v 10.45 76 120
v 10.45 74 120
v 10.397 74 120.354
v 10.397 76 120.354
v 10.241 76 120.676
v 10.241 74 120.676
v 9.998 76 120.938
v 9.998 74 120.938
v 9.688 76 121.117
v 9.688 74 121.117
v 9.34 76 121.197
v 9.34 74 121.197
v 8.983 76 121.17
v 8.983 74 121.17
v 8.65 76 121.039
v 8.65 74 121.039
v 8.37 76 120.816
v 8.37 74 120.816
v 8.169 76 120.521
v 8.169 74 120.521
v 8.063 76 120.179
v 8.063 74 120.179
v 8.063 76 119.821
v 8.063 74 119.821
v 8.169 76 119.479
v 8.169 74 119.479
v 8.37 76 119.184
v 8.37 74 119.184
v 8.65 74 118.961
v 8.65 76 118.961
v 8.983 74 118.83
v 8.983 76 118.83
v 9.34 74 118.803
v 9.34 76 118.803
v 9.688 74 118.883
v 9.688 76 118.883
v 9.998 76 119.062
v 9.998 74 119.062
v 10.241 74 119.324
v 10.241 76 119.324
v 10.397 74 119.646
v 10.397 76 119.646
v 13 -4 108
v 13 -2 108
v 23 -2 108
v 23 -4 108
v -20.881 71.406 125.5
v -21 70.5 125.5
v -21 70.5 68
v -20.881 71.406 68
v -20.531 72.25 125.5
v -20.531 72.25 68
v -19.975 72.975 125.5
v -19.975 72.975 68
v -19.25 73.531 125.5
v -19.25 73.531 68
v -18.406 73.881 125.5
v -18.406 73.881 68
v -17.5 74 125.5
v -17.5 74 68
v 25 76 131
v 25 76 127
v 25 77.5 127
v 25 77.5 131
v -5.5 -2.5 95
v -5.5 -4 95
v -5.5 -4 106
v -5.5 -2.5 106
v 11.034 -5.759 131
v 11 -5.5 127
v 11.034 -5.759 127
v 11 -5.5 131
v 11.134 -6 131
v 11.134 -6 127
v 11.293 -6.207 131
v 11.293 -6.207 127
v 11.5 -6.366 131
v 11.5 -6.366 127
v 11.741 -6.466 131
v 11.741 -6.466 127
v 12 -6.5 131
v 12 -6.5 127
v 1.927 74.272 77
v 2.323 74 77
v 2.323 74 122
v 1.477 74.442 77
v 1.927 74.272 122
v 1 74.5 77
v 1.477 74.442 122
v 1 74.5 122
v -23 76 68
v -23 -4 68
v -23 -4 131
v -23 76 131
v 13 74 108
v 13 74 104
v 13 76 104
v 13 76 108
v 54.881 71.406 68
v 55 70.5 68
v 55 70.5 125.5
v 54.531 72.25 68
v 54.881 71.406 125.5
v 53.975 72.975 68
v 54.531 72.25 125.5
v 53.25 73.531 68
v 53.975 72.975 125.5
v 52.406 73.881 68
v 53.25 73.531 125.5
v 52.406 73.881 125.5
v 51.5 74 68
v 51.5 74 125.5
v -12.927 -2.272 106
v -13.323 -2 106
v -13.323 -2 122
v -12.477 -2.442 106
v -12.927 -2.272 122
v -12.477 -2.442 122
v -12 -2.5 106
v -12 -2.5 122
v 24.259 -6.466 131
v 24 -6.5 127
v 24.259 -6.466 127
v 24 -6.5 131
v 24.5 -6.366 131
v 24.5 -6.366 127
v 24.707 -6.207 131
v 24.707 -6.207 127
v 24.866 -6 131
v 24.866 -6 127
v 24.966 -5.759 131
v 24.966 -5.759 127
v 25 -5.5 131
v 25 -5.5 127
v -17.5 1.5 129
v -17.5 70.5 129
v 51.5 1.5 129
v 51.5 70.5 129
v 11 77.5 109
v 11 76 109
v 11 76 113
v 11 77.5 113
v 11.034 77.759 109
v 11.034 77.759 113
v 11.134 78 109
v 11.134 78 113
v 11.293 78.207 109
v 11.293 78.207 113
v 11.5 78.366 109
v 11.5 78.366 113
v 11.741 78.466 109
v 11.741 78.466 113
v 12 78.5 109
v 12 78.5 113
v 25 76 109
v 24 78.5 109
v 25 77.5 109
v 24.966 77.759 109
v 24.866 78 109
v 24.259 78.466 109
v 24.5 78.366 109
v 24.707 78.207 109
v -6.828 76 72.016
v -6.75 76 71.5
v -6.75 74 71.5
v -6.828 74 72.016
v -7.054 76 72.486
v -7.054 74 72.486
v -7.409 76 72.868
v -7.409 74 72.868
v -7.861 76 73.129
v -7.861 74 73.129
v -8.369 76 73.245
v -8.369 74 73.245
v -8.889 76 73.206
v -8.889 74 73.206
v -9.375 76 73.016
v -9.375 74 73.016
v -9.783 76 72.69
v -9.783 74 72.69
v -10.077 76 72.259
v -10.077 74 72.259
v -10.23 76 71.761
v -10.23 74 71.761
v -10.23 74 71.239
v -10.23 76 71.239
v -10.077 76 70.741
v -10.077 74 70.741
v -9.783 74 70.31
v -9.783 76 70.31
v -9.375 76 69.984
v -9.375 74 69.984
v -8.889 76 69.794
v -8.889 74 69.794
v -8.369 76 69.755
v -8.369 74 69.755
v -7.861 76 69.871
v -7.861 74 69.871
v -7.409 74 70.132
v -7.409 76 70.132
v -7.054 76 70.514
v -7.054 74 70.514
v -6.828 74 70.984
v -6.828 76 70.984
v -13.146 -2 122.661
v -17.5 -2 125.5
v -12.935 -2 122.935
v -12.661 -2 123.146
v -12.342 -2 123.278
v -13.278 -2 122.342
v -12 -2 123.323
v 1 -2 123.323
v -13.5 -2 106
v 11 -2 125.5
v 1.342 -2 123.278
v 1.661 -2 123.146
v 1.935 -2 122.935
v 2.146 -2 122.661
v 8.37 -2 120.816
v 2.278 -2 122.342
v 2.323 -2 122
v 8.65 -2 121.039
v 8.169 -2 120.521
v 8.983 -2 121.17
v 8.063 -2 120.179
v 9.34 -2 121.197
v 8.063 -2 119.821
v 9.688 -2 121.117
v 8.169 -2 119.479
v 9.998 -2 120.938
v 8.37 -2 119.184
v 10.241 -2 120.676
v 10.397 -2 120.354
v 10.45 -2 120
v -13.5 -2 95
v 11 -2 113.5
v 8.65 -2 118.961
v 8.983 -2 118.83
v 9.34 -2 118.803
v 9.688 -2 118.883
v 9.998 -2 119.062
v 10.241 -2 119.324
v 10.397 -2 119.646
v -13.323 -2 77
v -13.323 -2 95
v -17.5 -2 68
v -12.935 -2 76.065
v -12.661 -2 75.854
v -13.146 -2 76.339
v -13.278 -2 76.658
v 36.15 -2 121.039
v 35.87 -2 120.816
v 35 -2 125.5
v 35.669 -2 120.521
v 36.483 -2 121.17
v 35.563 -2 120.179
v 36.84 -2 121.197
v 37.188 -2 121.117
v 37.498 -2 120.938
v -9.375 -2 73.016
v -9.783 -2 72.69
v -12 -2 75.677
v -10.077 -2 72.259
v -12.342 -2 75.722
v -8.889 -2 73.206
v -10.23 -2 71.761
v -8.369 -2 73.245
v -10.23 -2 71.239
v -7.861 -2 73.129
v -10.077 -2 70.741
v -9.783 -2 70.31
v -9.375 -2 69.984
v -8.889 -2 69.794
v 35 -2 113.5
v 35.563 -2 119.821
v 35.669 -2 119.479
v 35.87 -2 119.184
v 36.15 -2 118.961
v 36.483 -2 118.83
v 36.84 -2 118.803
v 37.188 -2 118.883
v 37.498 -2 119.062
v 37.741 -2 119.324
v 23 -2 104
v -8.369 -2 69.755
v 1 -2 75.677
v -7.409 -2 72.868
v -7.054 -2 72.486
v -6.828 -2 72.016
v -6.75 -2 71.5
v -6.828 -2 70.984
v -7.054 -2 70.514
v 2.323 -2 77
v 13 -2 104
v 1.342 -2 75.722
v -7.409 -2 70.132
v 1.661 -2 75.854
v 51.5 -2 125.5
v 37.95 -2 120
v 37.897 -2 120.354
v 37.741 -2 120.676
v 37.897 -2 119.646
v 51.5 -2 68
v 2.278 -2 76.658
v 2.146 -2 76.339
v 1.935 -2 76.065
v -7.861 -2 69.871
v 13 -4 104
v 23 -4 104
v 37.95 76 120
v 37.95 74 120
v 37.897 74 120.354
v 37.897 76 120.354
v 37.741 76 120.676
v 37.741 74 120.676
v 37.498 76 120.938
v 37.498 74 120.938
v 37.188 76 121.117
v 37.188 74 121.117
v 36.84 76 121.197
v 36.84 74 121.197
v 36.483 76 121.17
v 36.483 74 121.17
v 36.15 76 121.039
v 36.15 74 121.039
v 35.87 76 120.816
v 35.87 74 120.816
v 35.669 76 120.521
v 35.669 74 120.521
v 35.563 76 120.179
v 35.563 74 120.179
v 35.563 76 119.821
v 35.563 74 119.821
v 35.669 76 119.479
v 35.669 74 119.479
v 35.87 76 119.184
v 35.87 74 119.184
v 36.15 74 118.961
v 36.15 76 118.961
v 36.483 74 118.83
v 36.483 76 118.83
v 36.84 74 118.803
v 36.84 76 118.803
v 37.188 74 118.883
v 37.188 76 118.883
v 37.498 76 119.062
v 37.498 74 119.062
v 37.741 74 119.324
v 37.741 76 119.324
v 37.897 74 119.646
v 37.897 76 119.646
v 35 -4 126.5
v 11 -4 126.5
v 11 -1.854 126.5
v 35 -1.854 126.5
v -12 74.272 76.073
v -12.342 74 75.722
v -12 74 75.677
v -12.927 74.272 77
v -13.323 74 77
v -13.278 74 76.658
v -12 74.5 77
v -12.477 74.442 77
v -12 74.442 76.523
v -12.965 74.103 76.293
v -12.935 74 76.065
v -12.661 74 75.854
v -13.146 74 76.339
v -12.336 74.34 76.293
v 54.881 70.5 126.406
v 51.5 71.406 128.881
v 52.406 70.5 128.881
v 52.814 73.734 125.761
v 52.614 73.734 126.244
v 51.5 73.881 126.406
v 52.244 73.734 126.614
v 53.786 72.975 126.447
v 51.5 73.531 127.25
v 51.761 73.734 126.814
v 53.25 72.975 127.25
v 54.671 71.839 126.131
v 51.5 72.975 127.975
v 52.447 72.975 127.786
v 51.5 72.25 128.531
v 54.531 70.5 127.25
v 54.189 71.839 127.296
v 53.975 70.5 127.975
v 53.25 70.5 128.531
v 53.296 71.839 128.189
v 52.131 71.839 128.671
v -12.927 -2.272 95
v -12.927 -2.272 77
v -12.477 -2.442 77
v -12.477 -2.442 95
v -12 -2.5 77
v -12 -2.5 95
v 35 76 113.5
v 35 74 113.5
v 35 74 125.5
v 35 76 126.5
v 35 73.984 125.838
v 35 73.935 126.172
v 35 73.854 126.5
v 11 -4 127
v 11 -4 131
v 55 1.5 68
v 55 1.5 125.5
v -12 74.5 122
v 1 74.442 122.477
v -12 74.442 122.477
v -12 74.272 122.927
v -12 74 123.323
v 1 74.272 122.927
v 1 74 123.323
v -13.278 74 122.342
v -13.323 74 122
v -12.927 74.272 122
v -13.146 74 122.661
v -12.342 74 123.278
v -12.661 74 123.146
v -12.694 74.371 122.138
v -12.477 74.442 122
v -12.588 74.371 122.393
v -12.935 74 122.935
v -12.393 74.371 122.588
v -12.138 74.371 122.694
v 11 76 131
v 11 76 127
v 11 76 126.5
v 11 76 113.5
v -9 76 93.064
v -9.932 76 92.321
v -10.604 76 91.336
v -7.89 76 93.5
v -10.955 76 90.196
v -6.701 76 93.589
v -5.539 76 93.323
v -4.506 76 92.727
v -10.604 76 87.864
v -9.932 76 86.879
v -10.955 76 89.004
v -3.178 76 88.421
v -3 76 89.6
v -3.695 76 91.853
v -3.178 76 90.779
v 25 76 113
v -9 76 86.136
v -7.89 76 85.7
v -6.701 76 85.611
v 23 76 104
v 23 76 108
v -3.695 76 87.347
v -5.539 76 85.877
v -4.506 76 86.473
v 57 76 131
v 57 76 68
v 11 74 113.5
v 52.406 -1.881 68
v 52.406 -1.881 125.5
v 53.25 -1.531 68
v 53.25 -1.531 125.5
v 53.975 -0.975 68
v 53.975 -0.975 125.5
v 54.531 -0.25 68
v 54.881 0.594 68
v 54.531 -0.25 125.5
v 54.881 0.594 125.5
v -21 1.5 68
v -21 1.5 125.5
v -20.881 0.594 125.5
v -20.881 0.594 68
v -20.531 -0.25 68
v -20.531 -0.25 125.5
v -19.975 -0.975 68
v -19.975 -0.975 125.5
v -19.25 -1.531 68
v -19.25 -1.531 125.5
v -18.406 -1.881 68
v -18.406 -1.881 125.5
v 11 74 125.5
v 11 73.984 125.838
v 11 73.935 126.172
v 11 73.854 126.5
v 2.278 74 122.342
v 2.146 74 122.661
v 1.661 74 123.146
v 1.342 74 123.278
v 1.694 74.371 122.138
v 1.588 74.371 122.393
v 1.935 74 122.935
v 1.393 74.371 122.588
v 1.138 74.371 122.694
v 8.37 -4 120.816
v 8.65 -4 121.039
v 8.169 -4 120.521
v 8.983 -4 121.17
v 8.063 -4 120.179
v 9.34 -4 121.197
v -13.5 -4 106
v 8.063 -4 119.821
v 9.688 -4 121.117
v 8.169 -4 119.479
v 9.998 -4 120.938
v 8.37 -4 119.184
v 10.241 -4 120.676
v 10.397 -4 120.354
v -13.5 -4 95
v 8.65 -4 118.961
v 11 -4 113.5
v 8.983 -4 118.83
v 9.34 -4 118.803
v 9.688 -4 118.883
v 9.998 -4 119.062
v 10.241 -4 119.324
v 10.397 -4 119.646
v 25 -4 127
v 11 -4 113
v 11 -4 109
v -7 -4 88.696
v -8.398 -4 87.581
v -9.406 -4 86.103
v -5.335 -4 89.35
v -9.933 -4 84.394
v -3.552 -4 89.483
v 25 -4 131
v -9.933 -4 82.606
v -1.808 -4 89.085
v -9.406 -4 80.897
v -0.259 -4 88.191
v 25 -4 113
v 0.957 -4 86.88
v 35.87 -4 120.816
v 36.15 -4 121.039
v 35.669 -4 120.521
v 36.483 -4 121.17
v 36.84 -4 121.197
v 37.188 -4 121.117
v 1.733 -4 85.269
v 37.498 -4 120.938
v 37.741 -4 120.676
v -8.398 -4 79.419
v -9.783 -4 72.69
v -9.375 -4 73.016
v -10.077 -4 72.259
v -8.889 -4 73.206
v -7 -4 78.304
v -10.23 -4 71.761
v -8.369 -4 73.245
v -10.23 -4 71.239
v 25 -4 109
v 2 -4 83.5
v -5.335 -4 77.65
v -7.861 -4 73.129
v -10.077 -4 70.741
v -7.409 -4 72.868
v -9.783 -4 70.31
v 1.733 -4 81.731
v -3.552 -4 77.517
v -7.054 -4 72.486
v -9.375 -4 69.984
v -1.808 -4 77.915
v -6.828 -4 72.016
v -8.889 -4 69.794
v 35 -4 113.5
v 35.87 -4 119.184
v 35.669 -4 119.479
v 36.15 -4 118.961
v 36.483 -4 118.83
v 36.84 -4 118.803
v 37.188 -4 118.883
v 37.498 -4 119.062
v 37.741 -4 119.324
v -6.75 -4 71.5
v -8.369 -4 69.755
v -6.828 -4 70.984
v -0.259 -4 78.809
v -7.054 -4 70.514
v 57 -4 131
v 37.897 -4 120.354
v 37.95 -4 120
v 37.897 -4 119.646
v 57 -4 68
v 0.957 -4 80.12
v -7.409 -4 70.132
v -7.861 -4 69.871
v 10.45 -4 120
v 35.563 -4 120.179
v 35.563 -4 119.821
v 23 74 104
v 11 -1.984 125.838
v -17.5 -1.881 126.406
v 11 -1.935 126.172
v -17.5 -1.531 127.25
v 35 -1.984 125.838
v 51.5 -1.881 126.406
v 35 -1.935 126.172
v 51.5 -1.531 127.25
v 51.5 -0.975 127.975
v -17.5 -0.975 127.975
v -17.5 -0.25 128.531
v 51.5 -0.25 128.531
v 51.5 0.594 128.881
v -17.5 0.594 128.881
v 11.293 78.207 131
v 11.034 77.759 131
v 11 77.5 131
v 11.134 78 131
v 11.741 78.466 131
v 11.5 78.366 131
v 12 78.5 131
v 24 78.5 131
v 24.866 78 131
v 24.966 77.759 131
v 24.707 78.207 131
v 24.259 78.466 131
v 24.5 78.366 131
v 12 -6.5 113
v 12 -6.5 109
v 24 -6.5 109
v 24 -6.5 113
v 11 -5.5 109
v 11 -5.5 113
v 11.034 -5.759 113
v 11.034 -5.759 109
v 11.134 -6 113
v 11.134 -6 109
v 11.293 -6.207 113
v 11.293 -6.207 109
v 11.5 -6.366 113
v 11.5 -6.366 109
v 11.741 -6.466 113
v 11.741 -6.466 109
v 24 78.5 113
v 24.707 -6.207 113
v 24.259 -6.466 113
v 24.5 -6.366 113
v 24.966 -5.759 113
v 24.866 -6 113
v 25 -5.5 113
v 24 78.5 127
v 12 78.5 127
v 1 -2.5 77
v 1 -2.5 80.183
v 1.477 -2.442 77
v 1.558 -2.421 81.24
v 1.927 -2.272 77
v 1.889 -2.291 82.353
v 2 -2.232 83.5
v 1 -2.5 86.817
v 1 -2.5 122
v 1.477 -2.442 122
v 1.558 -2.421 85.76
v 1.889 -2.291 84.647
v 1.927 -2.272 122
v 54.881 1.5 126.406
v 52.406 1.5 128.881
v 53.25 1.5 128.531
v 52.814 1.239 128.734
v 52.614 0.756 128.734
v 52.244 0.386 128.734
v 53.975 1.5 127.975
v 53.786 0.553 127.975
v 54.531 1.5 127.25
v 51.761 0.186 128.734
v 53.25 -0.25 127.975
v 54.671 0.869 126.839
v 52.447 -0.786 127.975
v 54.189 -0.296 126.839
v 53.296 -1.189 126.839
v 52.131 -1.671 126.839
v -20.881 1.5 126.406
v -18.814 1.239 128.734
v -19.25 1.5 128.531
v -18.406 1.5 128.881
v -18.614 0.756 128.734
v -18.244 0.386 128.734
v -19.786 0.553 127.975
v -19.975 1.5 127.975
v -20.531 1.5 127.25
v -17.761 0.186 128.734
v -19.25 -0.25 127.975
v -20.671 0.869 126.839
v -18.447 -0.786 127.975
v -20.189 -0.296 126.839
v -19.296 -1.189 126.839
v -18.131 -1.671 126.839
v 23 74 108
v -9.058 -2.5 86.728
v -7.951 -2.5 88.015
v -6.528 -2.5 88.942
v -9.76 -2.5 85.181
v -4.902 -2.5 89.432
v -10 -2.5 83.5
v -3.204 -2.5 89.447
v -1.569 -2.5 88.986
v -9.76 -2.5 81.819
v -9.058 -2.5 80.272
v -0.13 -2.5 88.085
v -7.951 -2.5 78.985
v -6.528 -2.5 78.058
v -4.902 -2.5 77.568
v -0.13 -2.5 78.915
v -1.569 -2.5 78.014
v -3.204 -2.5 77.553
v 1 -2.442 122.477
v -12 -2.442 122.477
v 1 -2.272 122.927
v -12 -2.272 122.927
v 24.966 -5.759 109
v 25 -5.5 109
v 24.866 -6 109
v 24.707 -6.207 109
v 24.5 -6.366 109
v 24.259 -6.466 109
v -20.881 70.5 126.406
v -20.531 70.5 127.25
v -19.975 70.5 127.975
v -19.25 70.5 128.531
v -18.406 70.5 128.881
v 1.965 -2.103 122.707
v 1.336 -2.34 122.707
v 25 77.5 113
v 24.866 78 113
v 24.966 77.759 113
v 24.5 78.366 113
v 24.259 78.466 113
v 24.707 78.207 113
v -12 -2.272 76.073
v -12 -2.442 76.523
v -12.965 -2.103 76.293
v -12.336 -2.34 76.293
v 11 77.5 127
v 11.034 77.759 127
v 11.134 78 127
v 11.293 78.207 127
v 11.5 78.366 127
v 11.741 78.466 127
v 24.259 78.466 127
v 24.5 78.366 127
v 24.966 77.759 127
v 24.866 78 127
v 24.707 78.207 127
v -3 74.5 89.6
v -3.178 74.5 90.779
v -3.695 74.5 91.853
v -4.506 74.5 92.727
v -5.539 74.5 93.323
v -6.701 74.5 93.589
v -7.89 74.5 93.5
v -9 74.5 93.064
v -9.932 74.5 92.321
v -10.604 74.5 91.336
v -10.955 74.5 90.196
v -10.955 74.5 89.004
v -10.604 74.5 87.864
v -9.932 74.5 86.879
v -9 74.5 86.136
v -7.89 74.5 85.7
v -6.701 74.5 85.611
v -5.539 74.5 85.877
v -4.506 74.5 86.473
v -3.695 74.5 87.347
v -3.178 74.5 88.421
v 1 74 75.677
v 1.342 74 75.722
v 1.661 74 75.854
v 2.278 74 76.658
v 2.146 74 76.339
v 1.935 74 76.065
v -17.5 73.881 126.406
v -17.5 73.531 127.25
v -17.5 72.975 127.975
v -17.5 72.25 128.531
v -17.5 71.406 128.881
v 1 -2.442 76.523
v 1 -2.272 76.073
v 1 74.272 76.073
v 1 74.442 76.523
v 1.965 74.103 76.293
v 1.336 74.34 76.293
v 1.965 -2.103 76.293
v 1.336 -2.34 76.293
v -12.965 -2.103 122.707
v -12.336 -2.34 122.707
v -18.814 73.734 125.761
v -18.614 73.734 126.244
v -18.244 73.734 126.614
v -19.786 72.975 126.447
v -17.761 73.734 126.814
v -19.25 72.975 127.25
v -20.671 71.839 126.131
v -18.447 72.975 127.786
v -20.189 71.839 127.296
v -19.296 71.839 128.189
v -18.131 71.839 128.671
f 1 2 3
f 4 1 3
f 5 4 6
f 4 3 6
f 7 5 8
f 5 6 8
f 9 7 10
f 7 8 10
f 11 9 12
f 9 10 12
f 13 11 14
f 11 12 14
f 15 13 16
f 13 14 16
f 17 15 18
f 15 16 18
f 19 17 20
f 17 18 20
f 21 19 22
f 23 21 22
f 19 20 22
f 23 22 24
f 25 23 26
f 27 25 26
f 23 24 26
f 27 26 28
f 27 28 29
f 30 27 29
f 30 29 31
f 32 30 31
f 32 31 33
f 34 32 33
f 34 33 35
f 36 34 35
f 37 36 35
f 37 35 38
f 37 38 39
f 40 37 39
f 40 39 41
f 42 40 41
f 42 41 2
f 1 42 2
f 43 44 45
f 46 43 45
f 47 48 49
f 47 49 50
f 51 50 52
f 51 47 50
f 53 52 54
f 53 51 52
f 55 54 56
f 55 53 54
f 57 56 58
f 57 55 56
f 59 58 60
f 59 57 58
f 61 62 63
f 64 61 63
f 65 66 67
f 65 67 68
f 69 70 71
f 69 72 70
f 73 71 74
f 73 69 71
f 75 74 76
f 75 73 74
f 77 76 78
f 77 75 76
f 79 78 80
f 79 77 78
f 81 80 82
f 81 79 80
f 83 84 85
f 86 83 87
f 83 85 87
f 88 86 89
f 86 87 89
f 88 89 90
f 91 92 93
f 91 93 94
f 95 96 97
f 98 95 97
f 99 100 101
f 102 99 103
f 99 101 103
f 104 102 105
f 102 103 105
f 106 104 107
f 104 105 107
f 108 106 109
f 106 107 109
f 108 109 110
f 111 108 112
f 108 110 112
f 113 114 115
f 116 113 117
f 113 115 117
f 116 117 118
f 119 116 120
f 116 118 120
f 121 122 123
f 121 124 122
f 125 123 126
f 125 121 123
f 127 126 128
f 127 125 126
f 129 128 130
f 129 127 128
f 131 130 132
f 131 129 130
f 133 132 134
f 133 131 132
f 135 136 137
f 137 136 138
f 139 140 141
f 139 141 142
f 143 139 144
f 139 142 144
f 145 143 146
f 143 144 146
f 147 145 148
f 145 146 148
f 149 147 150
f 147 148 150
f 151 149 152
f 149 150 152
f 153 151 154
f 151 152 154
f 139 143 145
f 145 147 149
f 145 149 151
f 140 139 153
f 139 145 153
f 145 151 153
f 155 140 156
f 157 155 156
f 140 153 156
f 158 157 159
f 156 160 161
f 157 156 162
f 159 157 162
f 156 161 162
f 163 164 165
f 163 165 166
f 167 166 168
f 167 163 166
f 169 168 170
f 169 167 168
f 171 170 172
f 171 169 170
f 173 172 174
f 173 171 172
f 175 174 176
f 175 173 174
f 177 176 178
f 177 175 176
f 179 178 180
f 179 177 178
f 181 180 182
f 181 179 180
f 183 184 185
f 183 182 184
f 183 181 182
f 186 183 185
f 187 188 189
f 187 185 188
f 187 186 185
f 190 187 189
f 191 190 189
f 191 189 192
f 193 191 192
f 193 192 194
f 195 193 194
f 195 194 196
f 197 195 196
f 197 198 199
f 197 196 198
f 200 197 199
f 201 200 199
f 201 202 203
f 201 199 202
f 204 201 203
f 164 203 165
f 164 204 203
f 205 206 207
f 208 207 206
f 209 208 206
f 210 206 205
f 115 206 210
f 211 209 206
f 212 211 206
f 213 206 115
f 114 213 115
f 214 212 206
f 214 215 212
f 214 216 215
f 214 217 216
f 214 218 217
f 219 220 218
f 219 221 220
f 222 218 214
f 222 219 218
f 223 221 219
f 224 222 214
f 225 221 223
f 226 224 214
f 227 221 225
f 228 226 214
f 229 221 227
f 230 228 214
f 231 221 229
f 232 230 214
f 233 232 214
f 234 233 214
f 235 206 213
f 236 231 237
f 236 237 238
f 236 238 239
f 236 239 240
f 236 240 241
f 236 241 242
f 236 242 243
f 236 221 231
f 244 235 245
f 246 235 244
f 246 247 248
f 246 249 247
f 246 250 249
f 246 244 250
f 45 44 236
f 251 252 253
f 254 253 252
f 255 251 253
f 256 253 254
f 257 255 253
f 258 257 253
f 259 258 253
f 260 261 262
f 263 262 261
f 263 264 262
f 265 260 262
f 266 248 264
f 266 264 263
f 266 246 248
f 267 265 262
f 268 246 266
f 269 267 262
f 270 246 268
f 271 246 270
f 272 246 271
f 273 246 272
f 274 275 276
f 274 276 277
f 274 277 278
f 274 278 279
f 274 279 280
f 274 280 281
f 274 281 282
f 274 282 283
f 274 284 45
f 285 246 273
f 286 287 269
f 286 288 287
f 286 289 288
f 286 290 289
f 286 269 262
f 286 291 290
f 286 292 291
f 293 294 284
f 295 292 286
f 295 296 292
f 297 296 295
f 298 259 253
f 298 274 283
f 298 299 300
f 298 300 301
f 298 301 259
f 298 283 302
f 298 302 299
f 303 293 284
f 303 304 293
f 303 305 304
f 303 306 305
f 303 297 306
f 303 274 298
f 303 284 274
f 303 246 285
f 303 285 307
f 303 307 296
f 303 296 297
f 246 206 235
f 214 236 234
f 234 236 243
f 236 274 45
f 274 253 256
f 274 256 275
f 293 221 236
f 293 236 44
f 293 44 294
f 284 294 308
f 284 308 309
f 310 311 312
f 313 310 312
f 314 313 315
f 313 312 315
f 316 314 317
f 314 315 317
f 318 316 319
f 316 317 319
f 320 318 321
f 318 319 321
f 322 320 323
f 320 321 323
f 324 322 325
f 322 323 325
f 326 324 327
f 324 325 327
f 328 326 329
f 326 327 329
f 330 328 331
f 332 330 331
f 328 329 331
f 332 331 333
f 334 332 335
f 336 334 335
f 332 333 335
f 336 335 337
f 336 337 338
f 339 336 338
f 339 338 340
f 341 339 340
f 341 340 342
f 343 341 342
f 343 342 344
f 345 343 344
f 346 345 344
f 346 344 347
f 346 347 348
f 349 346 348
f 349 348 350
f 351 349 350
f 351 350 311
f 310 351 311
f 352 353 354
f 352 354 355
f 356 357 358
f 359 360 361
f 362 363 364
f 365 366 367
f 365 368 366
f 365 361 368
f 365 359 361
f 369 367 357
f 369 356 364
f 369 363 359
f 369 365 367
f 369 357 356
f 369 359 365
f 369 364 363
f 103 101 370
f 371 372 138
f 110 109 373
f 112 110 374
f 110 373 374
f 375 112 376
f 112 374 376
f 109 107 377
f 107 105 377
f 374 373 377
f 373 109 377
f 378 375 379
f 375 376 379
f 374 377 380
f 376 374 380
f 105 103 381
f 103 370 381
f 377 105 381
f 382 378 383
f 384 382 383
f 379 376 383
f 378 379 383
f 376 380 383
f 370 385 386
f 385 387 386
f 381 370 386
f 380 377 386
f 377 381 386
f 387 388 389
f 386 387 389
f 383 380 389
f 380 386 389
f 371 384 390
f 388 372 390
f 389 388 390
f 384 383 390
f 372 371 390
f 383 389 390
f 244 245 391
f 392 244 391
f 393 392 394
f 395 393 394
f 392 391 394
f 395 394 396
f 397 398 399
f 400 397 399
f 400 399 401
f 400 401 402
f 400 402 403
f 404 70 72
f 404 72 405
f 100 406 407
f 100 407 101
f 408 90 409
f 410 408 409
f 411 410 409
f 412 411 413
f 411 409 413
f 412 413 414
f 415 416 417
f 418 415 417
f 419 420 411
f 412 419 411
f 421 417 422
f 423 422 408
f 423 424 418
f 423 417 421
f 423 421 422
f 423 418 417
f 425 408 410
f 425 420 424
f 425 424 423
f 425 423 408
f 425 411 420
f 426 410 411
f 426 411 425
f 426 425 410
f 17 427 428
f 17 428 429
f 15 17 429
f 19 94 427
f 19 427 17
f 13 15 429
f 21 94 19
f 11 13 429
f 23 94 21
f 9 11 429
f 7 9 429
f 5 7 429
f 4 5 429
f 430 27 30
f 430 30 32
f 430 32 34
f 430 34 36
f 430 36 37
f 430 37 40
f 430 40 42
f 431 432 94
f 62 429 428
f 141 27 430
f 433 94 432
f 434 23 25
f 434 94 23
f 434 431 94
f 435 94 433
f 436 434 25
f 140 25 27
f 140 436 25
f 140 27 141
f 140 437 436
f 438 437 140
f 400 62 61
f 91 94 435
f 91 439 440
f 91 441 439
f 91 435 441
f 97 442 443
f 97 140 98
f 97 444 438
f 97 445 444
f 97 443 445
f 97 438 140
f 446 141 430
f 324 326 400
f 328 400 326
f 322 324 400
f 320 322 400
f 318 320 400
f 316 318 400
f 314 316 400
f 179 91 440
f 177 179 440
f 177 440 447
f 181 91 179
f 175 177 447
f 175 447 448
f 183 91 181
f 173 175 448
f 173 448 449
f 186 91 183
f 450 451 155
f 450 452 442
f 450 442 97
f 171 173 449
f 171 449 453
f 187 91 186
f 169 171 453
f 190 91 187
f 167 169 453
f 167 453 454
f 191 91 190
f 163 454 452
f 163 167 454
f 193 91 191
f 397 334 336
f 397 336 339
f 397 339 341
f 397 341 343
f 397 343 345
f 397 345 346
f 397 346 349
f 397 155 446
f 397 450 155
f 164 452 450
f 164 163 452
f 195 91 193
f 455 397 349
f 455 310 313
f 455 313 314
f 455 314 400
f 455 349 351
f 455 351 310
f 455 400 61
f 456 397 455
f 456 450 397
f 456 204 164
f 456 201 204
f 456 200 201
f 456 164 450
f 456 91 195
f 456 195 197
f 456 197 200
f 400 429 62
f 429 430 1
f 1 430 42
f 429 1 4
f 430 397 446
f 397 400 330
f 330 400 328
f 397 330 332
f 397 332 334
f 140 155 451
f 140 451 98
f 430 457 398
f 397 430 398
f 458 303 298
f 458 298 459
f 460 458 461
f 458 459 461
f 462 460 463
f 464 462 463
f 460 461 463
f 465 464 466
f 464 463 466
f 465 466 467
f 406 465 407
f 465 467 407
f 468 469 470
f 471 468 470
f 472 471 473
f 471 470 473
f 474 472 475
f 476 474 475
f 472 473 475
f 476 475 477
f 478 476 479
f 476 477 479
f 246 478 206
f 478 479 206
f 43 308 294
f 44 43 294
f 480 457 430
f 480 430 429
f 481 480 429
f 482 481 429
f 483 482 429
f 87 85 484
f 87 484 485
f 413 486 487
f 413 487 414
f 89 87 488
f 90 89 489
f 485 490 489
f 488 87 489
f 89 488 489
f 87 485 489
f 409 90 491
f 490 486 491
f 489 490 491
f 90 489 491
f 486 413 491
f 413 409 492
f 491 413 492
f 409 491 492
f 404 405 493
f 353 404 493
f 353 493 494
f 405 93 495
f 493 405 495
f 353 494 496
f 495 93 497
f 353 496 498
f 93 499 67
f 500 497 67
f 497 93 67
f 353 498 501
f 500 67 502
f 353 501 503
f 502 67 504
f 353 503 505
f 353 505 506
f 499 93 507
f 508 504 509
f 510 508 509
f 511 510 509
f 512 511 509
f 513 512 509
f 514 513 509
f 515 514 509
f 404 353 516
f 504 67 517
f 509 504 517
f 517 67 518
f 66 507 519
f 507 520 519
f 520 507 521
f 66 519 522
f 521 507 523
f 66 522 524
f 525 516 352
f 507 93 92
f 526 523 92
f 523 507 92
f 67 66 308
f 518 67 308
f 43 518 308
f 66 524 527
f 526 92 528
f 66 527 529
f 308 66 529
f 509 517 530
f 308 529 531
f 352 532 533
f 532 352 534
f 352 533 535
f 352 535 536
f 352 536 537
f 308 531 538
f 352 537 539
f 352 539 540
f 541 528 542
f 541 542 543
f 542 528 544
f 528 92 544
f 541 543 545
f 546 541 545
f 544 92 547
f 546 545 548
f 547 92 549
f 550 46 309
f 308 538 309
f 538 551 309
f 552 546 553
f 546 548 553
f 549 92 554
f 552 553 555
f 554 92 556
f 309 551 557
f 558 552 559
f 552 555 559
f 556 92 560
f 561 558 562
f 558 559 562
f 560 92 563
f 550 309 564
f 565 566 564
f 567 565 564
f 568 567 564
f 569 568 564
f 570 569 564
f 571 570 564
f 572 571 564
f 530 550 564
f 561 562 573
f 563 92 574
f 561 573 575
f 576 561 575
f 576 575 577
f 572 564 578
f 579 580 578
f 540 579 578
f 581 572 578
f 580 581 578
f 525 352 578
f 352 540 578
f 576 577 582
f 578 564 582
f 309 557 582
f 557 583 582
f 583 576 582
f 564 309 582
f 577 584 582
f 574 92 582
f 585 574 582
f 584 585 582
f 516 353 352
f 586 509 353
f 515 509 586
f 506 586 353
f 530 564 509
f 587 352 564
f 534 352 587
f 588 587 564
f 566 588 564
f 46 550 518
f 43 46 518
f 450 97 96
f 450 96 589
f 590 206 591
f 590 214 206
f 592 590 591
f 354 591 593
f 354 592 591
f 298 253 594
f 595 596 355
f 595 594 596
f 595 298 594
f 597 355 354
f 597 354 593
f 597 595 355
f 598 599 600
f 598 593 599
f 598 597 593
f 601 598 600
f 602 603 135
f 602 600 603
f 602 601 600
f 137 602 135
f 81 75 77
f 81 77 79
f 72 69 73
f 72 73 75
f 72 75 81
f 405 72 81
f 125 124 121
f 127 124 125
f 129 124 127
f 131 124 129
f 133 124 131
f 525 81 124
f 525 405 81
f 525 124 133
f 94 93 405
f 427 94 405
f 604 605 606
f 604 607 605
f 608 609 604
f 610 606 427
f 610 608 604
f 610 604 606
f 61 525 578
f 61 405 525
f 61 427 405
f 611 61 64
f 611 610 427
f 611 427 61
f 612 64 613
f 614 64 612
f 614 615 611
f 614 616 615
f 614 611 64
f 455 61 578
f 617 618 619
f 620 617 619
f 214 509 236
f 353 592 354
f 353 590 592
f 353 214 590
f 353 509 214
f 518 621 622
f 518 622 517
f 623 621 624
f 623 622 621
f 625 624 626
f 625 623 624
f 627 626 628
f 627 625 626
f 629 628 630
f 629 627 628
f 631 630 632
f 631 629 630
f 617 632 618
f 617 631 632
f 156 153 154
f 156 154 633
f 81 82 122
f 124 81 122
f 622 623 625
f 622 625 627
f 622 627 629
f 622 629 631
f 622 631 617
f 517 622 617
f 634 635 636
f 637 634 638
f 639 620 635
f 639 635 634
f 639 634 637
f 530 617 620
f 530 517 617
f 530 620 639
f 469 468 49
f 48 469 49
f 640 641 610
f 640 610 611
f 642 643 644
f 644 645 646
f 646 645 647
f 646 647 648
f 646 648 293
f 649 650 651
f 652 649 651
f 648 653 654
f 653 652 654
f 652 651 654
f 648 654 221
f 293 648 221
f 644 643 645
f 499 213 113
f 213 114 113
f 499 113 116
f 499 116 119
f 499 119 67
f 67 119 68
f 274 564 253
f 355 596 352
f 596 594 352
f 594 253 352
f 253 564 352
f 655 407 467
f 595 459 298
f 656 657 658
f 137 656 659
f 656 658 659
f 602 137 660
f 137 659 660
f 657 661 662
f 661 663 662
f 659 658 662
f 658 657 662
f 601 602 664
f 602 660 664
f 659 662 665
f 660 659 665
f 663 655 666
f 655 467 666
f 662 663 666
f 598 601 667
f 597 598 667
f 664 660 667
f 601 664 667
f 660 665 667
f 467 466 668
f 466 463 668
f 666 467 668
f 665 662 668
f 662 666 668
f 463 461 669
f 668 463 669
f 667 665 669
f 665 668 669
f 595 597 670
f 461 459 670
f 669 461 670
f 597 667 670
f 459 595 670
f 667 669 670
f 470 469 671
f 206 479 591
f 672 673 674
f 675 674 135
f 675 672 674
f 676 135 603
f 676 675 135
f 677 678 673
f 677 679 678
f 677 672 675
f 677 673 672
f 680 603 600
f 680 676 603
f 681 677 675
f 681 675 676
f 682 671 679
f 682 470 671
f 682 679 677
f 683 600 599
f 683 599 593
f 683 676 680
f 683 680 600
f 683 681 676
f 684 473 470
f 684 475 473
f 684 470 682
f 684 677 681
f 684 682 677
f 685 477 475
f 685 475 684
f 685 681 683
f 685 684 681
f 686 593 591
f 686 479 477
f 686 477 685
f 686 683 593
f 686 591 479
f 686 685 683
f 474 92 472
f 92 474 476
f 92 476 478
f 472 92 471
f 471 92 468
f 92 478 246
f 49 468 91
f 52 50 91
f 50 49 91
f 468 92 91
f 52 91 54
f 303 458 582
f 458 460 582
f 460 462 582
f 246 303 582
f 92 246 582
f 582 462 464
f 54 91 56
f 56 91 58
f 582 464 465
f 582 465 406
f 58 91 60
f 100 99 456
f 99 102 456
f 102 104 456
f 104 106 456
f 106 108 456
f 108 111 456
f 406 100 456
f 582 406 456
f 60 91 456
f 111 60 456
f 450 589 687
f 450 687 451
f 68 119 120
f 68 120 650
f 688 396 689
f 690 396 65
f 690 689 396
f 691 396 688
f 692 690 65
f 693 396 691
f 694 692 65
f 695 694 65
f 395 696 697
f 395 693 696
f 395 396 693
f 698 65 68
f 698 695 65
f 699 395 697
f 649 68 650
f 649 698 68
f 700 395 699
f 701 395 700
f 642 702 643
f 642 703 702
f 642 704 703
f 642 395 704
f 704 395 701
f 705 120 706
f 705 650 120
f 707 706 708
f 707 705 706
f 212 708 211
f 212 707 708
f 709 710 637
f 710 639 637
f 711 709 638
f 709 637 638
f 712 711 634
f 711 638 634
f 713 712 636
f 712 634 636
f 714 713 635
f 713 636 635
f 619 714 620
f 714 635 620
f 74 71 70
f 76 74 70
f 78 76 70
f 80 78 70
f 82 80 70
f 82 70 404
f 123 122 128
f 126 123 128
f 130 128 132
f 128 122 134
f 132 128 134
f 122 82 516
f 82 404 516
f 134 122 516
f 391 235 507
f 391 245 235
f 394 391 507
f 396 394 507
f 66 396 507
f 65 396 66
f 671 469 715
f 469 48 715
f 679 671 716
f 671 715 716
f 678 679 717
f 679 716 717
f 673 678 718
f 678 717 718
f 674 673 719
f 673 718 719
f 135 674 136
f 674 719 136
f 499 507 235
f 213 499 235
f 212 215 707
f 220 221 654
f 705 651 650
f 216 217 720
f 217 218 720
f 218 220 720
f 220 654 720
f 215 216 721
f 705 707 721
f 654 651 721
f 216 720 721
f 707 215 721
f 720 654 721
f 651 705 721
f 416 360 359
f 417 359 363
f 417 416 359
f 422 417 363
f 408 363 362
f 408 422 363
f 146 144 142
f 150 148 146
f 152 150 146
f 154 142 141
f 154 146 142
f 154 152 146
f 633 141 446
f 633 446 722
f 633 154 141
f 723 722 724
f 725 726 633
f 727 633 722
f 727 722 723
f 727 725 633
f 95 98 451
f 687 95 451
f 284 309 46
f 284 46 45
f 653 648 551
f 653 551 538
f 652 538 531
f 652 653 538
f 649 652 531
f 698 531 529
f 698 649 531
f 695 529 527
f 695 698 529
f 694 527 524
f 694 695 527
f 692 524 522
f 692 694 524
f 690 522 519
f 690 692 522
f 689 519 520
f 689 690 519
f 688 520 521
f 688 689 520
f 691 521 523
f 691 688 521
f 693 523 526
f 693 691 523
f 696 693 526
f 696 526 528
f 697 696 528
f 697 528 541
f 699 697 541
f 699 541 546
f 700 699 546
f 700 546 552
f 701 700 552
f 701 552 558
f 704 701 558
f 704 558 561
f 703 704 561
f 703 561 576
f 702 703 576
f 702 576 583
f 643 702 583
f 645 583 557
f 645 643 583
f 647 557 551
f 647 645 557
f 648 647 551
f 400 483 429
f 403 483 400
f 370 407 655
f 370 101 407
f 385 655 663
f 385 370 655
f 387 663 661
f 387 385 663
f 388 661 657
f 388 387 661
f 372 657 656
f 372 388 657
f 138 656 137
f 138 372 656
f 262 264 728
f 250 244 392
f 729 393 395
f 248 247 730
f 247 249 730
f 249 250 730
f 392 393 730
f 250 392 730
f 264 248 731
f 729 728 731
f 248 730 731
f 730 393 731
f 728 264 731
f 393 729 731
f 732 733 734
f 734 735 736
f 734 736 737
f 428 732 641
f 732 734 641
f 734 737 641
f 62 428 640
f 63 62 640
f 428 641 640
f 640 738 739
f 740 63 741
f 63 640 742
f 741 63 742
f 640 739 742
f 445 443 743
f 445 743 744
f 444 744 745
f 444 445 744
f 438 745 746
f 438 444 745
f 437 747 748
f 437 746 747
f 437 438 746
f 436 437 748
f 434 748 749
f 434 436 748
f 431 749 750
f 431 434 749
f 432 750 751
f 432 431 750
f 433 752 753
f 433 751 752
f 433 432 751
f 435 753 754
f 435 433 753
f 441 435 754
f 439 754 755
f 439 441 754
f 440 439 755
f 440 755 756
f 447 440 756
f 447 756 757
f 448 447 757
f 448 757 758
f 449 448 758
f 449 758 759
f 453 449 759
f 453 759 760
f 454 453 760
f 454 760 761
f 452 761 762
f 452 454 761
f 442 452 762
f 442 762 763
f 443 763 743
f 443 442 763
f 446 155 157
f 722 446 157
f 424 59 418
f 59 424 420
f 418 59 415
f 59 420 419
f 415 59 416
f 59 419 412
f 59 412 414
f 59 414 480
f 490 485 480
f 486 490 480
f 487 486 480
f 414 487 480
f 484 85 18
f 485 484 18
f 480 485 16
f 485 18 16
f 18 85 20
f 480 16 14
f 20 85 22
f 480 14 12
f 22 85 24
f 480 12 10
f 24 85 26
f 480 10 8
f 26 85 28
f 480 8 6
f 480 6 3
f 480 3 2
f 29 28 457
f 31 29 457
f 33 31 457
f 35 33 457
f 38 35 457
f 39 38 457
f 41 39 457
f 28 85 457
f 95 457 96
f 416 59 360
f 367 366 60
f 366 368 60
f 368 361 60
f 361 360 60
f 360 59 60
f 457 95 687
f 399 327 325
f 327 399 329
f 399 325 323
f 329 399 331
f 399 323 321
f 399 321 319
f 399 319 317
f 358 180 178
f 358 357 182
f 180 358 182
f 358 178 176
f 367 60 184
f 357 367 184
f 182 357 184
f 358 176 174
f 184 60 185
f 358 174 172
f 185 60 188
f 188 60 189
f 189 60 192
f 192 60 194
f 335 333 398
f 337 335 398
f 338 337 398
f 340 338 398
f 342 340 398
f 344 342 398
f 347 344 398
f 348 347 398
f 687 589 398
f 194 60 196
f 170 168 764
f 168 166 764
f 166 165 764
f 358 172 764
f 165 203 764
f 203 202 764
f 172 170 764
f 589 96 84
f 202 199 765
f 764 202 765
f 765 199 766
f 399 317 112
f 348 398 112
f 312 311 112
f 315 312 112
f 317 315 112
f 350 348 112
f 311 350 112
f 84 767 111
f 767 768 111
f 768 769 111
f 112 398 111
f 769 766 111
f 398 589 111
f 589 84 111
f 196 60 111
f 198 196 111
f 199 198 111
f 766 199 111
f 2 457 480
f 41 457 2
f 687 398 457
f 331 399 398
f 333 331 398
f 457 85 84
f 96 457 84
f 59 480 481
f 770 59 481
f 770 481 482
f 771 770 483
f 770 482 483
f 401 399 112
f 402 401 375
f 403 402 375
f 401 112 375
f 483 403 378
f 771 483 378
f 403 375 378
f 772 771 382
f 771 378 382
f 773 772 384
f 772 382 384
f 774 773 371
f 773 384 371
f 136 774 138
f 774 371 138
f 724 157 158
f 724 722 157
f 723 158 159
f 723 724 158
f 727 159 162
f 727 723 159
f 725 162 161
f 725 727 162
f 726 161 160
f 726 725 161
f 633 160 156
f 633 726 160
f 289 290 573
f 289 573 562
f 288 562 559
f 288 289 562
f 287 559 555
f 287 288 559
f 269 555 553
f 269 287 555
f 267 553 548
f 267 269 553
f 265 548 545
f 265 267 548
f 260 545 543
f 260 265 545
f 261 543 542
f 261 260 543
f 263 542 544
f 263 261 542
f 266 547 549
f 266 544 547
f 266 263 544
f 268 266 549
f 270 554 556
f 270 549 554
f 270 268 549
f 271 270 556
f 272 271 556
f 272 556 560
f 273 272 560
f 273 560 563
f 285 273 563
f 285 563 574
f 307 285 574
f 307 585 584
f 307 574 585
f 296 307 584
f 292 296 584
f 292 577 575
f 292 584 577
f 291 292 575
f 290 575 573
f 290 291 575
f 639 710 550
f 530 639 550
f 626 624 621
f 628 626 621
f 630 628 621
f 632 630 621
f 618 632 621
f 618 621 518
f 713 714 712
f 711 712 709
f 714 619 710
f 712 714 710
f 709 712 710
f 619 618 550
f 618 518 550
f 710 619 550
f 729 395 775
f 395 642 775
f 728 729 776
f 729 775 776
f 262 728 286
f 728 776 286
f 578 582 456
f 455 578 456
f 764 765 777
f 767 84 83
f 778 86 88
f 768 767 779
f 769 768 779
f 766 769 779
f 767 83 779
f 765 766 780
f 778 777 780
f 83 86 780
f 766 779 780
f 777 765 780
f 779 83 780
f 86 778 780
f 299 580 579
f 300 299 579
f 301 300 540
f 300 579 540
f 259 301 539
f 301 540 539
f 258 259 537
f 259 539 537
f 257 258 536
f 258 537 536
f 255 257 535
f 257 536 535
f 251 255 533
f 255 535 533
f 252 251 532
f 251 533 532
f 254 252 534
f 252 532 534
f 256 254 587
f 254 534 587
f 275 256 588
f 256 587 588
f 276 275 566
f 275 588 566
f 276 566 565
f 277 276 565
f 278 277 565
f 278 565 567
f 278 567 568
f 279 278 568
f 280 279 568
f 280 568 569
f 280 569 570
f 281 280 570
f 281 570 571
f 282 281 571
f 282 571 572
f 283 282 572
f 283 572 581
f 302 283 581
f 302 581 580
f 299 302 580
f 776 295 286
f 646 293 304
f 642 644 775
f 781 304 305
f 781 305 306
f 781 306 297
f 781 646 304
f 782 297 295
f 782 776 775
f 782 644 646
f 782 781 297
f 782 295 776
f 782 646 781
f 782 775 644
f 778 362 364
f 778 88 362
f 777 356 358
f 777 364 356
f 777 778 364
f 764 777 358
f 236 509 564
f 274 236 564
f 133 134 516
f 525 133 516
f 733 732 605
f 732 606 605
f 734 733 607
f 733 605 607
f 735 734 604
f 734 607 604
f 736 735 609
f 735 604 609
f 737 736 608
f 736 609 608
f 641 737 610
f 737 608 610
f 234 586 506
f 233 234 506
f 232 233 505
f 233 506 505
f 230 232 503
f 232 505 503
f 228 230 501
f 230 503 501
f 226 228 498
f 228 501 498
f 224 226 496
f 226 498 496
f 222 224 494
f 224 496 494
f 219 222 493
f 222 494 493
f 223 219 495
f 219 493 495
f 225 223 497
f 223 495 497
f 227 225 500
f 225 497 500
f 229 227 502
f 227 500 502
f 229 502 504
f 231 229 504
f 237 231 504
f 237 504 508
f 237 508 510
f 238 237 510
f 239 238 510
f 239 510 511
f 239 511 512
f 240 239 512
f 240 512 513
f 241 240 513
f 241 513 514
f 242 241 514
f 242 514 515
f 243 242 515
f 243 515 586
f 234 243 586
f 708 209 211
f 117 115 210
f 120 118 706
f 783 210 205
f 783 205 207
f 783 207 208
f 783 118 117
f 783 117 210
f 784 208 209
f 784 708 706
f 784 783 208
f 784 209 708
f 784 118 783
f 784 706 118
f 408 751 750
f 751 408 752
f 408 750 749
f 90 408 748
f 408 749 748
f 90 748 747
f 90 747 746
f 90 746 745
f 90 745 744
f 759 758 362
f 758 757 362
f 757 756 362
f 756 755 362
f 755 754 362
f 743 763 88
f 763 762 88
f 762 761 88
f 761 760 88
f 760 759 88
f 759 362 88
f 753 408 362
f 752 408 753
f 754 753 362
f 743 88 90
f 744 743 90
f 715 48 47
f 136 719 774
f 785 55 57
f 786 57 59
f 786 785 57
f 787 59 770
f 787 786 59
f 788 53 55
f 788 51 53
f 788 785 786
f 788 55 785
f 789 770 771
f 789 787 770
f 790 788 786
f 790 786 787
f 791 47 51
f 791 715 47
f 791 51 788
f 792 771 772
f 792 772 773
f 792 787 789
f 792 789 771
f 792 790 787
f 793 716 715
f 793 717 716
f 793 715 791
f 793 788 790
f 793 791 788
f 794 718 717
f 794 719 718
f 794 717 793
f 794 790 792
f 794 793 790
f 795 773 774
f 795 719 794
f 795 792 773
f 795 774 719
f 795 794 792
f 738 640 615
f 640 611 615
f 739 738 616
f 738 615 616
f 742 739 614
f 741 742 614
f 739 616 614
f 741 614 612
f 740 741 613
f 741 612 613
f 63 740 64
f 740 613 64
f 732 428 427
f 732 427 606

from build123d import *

# Parameters (mm, degrees)
BOX065_W               = 10
BOX065_H               = 94
BOX065_DEPTH           = 4
BOX062_W               = 14
BOX062_H               = 3
BOX062_DEPTH           = 4
BOX061_W               = 14
BOX061_H               = 3
BOX061_DEPTH           = 4
BOX063_W               = 14
BOX063_H               = 3
BOX063_DEPTH           = 4
BOX064_W               = 14
BOX064_H               = 3
BOX064_DEPTH           = 4
SKETCH017_R            = 1.2
SKETCH017_W            = 24
SKETCH017_H            = 13
PAD012_DEPTH           = 140
CYLINDER080_R          = 6
CYLINDER080_DEPTH      = 31
CYLINDER080_ROLL_ANGLE = 90
CYLINDER078_R          = 1.75
CYLINDER078_DEPTH      = 31
CYLINDER078_ROLL_ANGLE = 90
BOX059_W               = 17
BOX059_H               = 77
BOX059_DEPTH           = 49
FILLET018013005_R      = 2
CYLINDER083_R          = 4
CYLINDER083_DEPTH      = 31
CYLINDER083_ROLL_ANGLE = 90
CYLINDER079_R          = 1.75
CYLINDER079_DEPTH      = 31
CYLINDER079_ROLL_ANGLE = 90
BOX058_W               = 8
BOX058_H               = 24
BOX058_DEPTH           = 11
BOX057_W               = 76
BOX057_H               = 76
BOX057_DEPTH           = 66
FILLET018013003_R      = 3.5
BOX060_W               = 80
BOX060_H               = 80
BOX060_DEPTH           = 63
FILLET018013006_R      = 1


with BuildPart() as cubo:
    # Box065 → Box065 (new body)
    with BuildSketch(Plane(origin=(13, -11, 104), x_dir=(1, 0, 0), z_dir=(0, 0, 1))):
        with Locations((5, 47)):
            Rectangle(BOX065_W, BOX065_H)
    extrude(amount=BOX065_DEPTH)


with BuildPart() as cubo009:
    # Box062 → Box062 (new body)
    with BuildSketch(Plane(origin=(11, 75.5, 127), x_dir=(1, 0, 0), z_dir=(0, 0, 1))):
        with Locations((7, 1.5)):
            Rectangle(BOX062_W, BOX062_H)
    extrude(amount=BOX062_DEPTH)


with BuildPart() as cubo008:
    # Box061 → Box061 (new body)
    with BuildSketch(Plane(origin=(11, 75.5, 109), x_dir=(1, 0, 0), z_dir=(0, 0, 1))):
        with Locations((7, 1.5)):
            Rectangle(BOX061_W, BOX061_H)
    extrude(amount=BOX061_DEPTH)


with BuildPart() as cubo010:
    # Box063 → Box063 (new body)
    with BuildSketch(Plane(origin=(11, -6.5, 109), x_dir=(1, 0, 0), z_dir=(0, 0, 1))):
        with Locations((7, 1.5)):
            Rectangle(BOX063_W, BOX063_H)
    extrude(amount=BOX063_DEPTH)


with BuildPart() as cubo011:
    # Box064 → Box064 (new body)
    with BuildSketch(Plane(origin=(11, -6.5, 127), x_dir=(1, 0, 0), z_dir=(0, 0, 1))):
        with Locations((7, 1.5)):
            Rectangle(BOX064_W, BOX064_H)
    extrude(amount=BOX064_DEPTH)


with BuildPart() as pad012:
    # Sketch017 → Pad012 (new body)
    with BuildSketch(Plane(origin=(-0.25, -35, 0), x_dir=(1, 0, 0), z_dir=(0, -1, 0))):
        with Locations((37, 120)):
            Circle(SKETCH017_R)
        with Locations((9.5, 120)):
            Circle(SKETCH017_R)
        with Locations((23.25, 120)):
            Rectangle(SKETCH017_W, SKETCH017_H)
    extrude(amount=-PAD012_DEPTH)


with BuildPart() as cylinder107:
    # Cylinder080 → Cylinder080 (new body)
    with BuildSketch(Plane.XY):
        Circle(CYLINDER080_R)
    extrude(amount=CYLINDER080_DEPTH)


with BuildPart() as cylinder107_1:
    # Cylinder080 roll: moved
    add(cylinder107.part.rotate(Axis((0, 0, 0), (1, 0, 0)), CYLINDER080_ROLL_ANGLE))


with BuildPart() as cylinder107_2:
    # Cylinder080 placement: moved
    add(cylinder107_1.part.moved(Location((-4, 11, 83.5))))


with BuildPart() as cylinder105:
    # Cylinder078 → Cylinder078 (new body)
    with BuildSketch(Plane.XY):
        Circle(CYLINDER078_R)
    extrude(amount=CYLINDER078_DEPTH)


with BuildPart() as cylinder105_1:
    # Cylinder078 roll: moved
    add(cylinder105.part.rotate(Axis((0, 0, 0), (1, 0, 0)), CYLINDER078_ROLL_ANGLE))


with BuildPart() as cylinder105_2:
    # Cylinder078 placement: moved
    add(cylinder105_1.part.moved(Location((-8.5, 11, 71.5))))


with BuildPart() as fillet018013005:
    # Box059 → Box059 (new body)
    with BuildSketch(Plane(origin=(-14, -2.5, 75), x_dir=(1, 0, 0), z_dir=(0, 0, 1))):
        with Locations((8.5, 38.5)):
            Rectangle(BOX059_W, BOX059_H)
    extrude(amount=BOX059_DEPTH)

    # Fillet018013005
    fillet018013005_edges = [fillet018013005.edges().sort_by_distance(p)[0] for p in [
        (-14, -2.5, 99.5),
        (-14, 36, 124),
        (-14, 74.5, 99.5),
        (-14, 36, 75),
        (3, -2.5, 99.5),
        (3, 36, 124),
        (3, 74.5, 99.5),
        (3, 36, 75),
        (-5.5, -2.5, 75),
        (-5.5, -2.5, 124),
        (-5.5, 74.5, 75),
        (-5.5, 74.5, 124),
    ]]
    fillet(fillet018013005_edges, radius=FILLET018013005_R)


with BuildPart() as cylinder108:
    # Cylinder083 → Cylinder083 (new body)
    with BuildSketch(Plane.XY):
        Circle(CYLINDER083_R)
    extrude(amount=CYLINDER083_DEPTH)


with BuildPart() as cylinder108_1:
    # Cylinder083 roll: moved
    add(cylinder108.part.rotate(Axis((0, 0, 0), (1, 0, 0)), CYLINDER083_ROLL_ANGLE))


with BuildPart() as cylinder108_2:
    # Cylinder083 placement: moved
    add(cylinder108_1.part.moved(Location((-7, 80, 89.6))))


with BuildPart() as cylinder106:
    # Cylinder079 → Cylinder079 (new body)
    with BuildSketch(Plane.XY):
        Circle(CYLINDER079_R)
    extrude(amount=CYLINDER079_DEPTH)


with BuildPart() as cylinder106_1:
    # Cylinder079 roll: moved
    add(cylinder106.part.rotate(Axis((0, 0, 0), (1, 0, 0)), CYLINDER079_ROLL_ANGLE))


with BuildPart() as cylinder106_2:
    # Cylinder079 placement: moved
    add(cylinder106_1.part.moved(Location((-8.5, 80, 71.5))))


with BuildPart() as fusion061:
    # Box058 → Box058 (new body)
    with BuildSketch(Plane(origin=(-13.5, -13, 95), x_dir=(1, 0, 0), z_dir=(0, 0, 1))):
        with Locations((4, 12)):
            Rectangle(BOX058_W, BOX058_H)
    extrude(amount=BOX058_DEPTH)

    # Fusion061: union Cylinder107, Cylinder105, Fillet018013005, Cylinder108, Cylinder106
    add(cylinder107_2.part)
    add(cylinder105_2.part)
    add(fillet018013005.part)
    add(cylinder108_2.part)
    add(cylinder106_2.part)


with BuildPart() as fillet018013003:
    # Box057 → Box057 (new body)
    with BuildSketch(Plane(origin=(-21, -2, 87), x_dir=(1, 0, 0), z_dir=(0, 0, 1))):
        with Locations((38, 38)):
            Rectangle(BOX057_W, BOX057_H)
    extrude(amount=BOX057_DEPTH)

    # Fillet018013003
    fillet018013003_edges = [fillet018013003.edges().sort_by_distance(p)[0] for p in [
        (-21, -2, 120),
        (-21, 36, 153),
        (-21, 74, 120),
        (55, -2, 120),
        (55, 36, 153),
        (55, 74, 120),
        (17, -2, 153),
        (17, 74, 153),
    ]]
    fillet(fillet018013003_edges, radius=FILLET018013003_R)


with BuildPart() as fillet018013003_1:
    # Fillet018013003 placement: moved
    add(fillet018013003.part.moved(Location((0, 0, -24))))


with BuildPart() as body_src:
    # Box060 → Box060 (new body)
    with BuildSketch(Plane(origin=(-23, -4, 68), x_dir=(1, 0, 0), z_dir=(0, 0, 1))):
        with Locations((40, 40)):
            Rectangle(BOX060_W, BOX060_H)
    extrude(amount=BOX060_DEPTH)

    # Cut103: cut Fillet018013003
    add(fillet018013003_1.part, mode=Mode.SUBTRACT)

    # Cut104: cut Fusion061
    add(fusion061.part, mode=Mode.SUBTRACT)

    # Cut105: cut Pad012
    add(pad012.part, mode=Mode.SUBTRACT)

    # Fusion062: union Cubo009, Cubo008, Cubo010, Cubo011
    add(cubo009.part)
    add(cubo008.part)
    add(cubo010.part)
    add(cubo011.part)

    # Fillet018013006
    fillet018013006_edges = [body_src.edges().sort_by_distance(p)[0] for p in [
        (25, -6.5, 129),
        (11, -6.5, 129),
        (11, -6.5, 111),
        (25, -6.5, 111),
        (25, 78.5, 129),
        (11, 78.5, 129),
        (25, 78.5, 111),
        (11, 78.5, 111),
    ]]
    fillet(fillet018013006_edges, radius=FILLET018013006_R)

    # Cut107: cut Cubo
    add(cubo.part, mode=Mode.SUBTRACT)


solid = body_src.part
